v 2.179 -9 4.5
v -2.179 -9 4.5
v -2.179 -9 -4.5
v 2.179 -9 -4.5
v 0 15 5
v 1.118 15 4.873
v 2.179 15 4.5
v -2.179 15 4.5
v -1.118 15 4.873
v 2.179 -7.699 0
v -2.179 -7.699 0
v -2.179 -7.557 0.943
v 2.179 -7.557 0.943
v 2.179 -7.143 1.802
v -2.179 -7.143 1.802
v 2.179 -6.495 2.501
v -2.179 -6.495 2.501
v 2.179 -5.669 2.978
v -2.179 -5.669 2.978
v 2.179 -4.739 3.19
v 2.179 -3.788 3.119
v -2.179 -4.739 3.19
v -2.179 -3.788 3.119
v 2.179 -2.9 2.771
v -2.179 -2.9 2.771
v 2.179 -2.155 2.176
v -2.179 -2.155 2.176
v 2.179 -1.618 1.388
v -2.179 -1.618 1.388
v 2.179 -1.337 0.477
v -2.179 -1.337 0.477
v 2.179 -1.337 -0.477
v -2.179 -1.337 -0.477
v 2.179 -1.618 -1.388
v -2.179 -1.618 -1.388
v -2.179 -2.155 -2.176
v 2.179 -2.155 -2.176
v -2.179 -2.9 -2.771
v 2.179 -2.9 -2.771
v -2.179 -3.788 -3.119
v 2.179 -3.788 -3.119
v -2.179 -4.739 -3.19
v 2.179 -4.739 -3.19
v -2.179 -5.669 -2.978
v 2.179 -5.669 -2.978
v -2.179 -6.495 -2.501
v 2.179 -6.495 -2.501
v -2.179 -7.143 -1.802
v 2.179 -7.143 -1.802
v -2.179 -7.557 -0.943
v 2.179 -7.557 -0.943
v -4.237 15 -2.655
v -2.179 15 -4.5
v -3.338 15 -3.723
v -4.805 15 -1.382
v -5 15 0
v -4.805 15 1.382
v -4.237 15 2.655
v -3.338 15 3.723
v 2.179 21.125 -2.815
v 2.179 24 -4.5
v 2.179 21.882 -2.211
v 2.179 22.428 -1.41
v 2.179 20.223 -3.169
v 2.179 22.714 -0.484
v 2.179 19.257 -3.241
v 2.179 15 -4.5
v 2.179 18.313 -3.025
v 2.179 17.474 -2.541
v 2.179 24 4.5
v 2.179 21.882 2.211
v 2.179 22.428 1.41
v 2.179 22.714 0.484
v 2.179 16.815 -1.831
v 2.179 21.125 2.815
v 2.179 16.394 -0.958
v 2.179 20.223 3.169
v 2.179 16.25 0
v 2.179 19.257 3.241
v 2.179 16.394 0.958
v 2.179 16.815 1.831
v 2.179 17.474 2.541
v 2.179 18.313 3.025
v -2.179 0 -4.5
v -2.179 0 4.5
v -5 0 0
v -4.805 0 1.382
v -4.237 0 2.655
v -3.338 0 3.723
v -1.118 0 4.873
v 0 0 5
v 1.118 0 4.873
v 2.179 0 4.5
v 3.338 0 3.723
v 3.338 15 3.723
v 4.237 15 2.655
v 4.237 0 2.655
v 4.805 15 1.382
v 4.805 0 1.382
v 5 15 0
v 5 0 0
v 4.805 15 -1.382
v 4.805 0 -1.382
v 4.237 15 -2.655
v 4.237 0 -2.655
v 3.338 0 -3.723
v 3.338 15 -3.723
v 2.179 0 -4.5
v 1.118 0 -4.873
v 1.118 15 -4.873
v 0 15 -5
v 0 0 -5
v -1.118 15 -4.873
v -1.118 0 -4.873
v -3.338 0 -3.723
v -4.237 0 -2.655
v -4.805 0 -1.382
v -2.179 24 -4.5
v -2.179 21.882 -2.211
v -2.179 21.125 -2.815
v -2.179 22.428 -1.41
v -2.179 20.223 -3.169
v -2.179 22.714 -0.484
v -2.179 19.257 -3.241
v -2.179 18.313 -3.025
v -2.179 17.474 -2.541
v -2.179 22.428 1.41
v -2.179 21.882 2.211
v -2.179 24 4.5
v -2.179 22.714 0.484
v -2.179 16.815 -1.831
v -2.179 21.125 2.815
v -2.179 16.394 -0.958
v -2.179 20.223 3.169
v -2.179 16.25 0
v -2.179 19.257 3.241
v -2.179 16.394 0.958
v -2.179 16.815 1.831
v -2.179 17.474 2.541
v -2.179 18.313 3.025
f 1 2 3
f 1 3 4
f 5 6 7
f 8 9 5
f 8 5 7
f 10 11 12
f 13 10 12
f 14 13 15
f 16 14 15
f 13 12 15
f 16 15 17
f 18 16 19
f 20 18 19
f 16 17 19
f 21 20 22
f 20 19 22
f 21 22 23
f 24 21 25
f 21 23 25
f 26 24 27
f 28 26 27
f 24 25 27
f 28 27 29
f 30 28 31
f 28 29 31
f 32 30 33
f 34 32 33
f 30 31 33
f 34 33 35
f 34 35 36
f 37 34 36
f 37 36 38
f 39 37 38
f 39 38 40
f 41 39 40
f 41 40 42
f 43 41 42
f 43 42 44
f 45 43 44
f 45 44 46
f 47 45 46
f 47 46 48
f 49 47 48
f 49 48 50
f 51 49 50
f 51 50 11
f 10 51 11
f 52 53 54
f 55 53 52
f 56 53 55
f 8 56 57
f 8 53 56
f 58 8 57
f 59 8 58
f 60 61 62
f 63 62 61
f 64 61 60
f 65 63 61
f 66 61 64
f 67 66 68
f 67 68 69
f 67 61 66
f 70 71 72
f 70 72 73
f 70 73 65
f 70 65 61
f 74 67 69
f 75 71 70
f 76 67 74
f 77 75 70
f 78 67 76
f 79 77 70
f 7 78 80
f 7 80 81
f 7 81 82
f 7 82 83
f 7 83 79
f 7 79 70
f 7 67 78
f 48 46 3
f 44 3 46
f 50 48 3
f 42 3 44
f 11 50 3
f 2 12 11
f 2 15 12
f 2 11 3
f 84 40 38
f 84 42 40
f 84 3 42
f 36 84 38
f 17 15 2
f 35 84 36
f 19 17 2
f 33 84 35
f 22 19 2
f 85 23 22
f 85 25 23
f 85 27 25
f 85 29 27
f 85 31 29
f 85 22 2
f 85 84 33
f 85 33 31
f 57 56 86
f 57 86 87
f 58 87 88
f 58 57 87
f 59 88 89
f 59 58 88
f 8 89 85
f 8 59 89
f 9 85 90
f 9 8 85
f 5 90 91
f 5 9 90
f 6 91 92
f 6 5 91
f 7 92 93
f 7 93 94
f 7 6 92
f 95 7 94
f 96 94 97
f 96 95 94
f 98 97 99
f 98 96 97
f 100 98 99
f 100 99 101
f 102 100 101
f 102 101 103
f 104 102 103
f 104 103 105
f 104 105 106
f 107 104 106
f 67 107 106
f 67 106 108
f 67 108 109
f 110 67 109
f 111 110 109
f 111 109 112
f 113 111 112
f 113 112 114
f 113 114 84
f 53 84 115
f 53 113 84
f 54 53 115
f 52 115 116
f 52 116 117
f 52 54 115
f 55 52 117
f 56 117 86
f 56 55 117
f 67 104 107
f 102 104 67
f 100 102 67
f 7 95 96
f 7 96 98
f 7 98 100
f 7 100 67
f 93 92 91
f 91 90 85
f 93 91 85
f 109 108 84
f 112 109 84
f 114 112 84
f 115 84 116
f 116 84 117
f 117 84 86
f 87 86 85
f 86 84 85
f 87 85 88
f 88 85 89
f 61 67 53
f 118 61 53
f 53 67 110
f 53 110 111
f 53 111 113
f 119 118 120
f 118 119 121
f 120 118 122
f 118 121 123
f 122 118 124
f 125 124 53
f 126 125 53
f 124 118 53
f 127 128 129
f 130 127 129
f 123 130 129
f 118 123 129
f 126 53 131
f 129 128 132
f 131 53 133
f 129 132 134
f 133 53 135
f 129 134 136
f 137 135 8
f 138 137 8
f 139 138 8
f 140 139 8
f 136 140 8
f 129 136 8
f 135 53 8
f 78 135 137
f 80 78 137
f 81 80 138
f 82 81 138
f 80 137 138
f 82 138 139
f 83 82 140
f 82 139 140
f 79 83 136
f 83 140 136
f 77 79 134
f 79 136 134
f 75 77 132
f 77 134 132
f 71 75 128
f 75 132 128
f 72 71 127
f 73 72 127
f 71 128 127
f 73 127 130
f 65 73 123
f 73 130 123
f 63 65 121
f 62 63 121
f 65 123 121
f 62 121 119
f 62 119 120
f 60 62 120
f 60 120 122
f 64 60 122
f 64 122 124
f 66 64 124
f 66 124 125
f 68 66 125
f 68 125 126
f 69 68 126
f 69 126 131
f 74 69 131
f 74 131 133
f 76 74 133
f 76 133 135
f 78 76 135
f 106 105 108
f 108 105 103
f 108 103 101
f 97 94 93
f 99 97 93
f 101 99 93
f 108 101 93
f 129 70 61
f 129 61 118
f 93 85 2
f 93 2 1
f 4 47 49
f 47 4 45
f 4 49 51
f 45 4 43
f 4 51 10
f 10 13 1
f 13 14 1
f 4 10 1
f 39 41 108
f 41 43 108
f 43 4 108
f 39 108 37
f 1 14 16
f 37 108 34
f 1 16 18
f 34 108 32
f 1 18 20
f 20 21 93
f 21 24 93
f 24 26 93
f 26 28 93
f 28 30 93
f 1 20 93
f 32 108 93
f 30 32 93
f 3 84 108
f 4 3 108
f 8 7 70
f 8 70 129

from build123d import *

# Parameters (mm, degrees)
F0_W     = 5
F0_H     = 15
F2_W     = 4.3588989435
F2_H     = 9
F3_DEPTH = 9
F4_R     = 3.1991269496
F5_DEPTH = 5
F6_W     = 4.3588989435
F6_H     = 9
F7_DEPTH = 9
F8_R     = 3.25
F9_DEPTH = 5


with BuildPart() as f1:
    # F0 (on Top) → F1 (revolve)
    with BuildSketch(Plane.XY):
        with Locations((-2.5, 7.5)):
            Rectangle(F0_W, F0_H)
    revolve(axis=Axis((0, 7.5, 0), (0, 1, 0)))

    # F2 (on face) → F3 (join)
    with BuildSketch(Plane.XZ):
        Rectangle(F2_W, F2_H)
    extrude(amount=F3_DEPTH)

    # F4 (on face) → F5 (cut)
    with BuildSketch(Plane(origin=(-2.1794494718, 0, 0), x_dir=(0, -1, 0), z_dir=(-1, 0, 0))):
        with Locations((4.5, 0)):
            Circle(F4_R)
    extrude(amount=-F5_DEPTH, mode=Mode.SUBTRACT)

    # F6 (on face) → F7 (join)
    with BuildSketch(Plane(origin=(0, 15, 0), x_dir=(-1, 0, 0), z_dir=(0, 1, 0))):
        Rectangle(F6_W, F6_H)
    extrude(amount=F7_DEPTH)

    # F8 (on face) → F9 (cut)
    with BuildSketch(Plane(origin=(-2.1794494718, 0, 0), x_dir=(0, -1, 0), z_dir=(-1, 0, 0))):
        with Locations((-19.5, 0)):
            Circle(F8_R)
    extrude(amount=-F9_DEPTH, mode=Mode.SUBTRACT)


solid = f1.part
